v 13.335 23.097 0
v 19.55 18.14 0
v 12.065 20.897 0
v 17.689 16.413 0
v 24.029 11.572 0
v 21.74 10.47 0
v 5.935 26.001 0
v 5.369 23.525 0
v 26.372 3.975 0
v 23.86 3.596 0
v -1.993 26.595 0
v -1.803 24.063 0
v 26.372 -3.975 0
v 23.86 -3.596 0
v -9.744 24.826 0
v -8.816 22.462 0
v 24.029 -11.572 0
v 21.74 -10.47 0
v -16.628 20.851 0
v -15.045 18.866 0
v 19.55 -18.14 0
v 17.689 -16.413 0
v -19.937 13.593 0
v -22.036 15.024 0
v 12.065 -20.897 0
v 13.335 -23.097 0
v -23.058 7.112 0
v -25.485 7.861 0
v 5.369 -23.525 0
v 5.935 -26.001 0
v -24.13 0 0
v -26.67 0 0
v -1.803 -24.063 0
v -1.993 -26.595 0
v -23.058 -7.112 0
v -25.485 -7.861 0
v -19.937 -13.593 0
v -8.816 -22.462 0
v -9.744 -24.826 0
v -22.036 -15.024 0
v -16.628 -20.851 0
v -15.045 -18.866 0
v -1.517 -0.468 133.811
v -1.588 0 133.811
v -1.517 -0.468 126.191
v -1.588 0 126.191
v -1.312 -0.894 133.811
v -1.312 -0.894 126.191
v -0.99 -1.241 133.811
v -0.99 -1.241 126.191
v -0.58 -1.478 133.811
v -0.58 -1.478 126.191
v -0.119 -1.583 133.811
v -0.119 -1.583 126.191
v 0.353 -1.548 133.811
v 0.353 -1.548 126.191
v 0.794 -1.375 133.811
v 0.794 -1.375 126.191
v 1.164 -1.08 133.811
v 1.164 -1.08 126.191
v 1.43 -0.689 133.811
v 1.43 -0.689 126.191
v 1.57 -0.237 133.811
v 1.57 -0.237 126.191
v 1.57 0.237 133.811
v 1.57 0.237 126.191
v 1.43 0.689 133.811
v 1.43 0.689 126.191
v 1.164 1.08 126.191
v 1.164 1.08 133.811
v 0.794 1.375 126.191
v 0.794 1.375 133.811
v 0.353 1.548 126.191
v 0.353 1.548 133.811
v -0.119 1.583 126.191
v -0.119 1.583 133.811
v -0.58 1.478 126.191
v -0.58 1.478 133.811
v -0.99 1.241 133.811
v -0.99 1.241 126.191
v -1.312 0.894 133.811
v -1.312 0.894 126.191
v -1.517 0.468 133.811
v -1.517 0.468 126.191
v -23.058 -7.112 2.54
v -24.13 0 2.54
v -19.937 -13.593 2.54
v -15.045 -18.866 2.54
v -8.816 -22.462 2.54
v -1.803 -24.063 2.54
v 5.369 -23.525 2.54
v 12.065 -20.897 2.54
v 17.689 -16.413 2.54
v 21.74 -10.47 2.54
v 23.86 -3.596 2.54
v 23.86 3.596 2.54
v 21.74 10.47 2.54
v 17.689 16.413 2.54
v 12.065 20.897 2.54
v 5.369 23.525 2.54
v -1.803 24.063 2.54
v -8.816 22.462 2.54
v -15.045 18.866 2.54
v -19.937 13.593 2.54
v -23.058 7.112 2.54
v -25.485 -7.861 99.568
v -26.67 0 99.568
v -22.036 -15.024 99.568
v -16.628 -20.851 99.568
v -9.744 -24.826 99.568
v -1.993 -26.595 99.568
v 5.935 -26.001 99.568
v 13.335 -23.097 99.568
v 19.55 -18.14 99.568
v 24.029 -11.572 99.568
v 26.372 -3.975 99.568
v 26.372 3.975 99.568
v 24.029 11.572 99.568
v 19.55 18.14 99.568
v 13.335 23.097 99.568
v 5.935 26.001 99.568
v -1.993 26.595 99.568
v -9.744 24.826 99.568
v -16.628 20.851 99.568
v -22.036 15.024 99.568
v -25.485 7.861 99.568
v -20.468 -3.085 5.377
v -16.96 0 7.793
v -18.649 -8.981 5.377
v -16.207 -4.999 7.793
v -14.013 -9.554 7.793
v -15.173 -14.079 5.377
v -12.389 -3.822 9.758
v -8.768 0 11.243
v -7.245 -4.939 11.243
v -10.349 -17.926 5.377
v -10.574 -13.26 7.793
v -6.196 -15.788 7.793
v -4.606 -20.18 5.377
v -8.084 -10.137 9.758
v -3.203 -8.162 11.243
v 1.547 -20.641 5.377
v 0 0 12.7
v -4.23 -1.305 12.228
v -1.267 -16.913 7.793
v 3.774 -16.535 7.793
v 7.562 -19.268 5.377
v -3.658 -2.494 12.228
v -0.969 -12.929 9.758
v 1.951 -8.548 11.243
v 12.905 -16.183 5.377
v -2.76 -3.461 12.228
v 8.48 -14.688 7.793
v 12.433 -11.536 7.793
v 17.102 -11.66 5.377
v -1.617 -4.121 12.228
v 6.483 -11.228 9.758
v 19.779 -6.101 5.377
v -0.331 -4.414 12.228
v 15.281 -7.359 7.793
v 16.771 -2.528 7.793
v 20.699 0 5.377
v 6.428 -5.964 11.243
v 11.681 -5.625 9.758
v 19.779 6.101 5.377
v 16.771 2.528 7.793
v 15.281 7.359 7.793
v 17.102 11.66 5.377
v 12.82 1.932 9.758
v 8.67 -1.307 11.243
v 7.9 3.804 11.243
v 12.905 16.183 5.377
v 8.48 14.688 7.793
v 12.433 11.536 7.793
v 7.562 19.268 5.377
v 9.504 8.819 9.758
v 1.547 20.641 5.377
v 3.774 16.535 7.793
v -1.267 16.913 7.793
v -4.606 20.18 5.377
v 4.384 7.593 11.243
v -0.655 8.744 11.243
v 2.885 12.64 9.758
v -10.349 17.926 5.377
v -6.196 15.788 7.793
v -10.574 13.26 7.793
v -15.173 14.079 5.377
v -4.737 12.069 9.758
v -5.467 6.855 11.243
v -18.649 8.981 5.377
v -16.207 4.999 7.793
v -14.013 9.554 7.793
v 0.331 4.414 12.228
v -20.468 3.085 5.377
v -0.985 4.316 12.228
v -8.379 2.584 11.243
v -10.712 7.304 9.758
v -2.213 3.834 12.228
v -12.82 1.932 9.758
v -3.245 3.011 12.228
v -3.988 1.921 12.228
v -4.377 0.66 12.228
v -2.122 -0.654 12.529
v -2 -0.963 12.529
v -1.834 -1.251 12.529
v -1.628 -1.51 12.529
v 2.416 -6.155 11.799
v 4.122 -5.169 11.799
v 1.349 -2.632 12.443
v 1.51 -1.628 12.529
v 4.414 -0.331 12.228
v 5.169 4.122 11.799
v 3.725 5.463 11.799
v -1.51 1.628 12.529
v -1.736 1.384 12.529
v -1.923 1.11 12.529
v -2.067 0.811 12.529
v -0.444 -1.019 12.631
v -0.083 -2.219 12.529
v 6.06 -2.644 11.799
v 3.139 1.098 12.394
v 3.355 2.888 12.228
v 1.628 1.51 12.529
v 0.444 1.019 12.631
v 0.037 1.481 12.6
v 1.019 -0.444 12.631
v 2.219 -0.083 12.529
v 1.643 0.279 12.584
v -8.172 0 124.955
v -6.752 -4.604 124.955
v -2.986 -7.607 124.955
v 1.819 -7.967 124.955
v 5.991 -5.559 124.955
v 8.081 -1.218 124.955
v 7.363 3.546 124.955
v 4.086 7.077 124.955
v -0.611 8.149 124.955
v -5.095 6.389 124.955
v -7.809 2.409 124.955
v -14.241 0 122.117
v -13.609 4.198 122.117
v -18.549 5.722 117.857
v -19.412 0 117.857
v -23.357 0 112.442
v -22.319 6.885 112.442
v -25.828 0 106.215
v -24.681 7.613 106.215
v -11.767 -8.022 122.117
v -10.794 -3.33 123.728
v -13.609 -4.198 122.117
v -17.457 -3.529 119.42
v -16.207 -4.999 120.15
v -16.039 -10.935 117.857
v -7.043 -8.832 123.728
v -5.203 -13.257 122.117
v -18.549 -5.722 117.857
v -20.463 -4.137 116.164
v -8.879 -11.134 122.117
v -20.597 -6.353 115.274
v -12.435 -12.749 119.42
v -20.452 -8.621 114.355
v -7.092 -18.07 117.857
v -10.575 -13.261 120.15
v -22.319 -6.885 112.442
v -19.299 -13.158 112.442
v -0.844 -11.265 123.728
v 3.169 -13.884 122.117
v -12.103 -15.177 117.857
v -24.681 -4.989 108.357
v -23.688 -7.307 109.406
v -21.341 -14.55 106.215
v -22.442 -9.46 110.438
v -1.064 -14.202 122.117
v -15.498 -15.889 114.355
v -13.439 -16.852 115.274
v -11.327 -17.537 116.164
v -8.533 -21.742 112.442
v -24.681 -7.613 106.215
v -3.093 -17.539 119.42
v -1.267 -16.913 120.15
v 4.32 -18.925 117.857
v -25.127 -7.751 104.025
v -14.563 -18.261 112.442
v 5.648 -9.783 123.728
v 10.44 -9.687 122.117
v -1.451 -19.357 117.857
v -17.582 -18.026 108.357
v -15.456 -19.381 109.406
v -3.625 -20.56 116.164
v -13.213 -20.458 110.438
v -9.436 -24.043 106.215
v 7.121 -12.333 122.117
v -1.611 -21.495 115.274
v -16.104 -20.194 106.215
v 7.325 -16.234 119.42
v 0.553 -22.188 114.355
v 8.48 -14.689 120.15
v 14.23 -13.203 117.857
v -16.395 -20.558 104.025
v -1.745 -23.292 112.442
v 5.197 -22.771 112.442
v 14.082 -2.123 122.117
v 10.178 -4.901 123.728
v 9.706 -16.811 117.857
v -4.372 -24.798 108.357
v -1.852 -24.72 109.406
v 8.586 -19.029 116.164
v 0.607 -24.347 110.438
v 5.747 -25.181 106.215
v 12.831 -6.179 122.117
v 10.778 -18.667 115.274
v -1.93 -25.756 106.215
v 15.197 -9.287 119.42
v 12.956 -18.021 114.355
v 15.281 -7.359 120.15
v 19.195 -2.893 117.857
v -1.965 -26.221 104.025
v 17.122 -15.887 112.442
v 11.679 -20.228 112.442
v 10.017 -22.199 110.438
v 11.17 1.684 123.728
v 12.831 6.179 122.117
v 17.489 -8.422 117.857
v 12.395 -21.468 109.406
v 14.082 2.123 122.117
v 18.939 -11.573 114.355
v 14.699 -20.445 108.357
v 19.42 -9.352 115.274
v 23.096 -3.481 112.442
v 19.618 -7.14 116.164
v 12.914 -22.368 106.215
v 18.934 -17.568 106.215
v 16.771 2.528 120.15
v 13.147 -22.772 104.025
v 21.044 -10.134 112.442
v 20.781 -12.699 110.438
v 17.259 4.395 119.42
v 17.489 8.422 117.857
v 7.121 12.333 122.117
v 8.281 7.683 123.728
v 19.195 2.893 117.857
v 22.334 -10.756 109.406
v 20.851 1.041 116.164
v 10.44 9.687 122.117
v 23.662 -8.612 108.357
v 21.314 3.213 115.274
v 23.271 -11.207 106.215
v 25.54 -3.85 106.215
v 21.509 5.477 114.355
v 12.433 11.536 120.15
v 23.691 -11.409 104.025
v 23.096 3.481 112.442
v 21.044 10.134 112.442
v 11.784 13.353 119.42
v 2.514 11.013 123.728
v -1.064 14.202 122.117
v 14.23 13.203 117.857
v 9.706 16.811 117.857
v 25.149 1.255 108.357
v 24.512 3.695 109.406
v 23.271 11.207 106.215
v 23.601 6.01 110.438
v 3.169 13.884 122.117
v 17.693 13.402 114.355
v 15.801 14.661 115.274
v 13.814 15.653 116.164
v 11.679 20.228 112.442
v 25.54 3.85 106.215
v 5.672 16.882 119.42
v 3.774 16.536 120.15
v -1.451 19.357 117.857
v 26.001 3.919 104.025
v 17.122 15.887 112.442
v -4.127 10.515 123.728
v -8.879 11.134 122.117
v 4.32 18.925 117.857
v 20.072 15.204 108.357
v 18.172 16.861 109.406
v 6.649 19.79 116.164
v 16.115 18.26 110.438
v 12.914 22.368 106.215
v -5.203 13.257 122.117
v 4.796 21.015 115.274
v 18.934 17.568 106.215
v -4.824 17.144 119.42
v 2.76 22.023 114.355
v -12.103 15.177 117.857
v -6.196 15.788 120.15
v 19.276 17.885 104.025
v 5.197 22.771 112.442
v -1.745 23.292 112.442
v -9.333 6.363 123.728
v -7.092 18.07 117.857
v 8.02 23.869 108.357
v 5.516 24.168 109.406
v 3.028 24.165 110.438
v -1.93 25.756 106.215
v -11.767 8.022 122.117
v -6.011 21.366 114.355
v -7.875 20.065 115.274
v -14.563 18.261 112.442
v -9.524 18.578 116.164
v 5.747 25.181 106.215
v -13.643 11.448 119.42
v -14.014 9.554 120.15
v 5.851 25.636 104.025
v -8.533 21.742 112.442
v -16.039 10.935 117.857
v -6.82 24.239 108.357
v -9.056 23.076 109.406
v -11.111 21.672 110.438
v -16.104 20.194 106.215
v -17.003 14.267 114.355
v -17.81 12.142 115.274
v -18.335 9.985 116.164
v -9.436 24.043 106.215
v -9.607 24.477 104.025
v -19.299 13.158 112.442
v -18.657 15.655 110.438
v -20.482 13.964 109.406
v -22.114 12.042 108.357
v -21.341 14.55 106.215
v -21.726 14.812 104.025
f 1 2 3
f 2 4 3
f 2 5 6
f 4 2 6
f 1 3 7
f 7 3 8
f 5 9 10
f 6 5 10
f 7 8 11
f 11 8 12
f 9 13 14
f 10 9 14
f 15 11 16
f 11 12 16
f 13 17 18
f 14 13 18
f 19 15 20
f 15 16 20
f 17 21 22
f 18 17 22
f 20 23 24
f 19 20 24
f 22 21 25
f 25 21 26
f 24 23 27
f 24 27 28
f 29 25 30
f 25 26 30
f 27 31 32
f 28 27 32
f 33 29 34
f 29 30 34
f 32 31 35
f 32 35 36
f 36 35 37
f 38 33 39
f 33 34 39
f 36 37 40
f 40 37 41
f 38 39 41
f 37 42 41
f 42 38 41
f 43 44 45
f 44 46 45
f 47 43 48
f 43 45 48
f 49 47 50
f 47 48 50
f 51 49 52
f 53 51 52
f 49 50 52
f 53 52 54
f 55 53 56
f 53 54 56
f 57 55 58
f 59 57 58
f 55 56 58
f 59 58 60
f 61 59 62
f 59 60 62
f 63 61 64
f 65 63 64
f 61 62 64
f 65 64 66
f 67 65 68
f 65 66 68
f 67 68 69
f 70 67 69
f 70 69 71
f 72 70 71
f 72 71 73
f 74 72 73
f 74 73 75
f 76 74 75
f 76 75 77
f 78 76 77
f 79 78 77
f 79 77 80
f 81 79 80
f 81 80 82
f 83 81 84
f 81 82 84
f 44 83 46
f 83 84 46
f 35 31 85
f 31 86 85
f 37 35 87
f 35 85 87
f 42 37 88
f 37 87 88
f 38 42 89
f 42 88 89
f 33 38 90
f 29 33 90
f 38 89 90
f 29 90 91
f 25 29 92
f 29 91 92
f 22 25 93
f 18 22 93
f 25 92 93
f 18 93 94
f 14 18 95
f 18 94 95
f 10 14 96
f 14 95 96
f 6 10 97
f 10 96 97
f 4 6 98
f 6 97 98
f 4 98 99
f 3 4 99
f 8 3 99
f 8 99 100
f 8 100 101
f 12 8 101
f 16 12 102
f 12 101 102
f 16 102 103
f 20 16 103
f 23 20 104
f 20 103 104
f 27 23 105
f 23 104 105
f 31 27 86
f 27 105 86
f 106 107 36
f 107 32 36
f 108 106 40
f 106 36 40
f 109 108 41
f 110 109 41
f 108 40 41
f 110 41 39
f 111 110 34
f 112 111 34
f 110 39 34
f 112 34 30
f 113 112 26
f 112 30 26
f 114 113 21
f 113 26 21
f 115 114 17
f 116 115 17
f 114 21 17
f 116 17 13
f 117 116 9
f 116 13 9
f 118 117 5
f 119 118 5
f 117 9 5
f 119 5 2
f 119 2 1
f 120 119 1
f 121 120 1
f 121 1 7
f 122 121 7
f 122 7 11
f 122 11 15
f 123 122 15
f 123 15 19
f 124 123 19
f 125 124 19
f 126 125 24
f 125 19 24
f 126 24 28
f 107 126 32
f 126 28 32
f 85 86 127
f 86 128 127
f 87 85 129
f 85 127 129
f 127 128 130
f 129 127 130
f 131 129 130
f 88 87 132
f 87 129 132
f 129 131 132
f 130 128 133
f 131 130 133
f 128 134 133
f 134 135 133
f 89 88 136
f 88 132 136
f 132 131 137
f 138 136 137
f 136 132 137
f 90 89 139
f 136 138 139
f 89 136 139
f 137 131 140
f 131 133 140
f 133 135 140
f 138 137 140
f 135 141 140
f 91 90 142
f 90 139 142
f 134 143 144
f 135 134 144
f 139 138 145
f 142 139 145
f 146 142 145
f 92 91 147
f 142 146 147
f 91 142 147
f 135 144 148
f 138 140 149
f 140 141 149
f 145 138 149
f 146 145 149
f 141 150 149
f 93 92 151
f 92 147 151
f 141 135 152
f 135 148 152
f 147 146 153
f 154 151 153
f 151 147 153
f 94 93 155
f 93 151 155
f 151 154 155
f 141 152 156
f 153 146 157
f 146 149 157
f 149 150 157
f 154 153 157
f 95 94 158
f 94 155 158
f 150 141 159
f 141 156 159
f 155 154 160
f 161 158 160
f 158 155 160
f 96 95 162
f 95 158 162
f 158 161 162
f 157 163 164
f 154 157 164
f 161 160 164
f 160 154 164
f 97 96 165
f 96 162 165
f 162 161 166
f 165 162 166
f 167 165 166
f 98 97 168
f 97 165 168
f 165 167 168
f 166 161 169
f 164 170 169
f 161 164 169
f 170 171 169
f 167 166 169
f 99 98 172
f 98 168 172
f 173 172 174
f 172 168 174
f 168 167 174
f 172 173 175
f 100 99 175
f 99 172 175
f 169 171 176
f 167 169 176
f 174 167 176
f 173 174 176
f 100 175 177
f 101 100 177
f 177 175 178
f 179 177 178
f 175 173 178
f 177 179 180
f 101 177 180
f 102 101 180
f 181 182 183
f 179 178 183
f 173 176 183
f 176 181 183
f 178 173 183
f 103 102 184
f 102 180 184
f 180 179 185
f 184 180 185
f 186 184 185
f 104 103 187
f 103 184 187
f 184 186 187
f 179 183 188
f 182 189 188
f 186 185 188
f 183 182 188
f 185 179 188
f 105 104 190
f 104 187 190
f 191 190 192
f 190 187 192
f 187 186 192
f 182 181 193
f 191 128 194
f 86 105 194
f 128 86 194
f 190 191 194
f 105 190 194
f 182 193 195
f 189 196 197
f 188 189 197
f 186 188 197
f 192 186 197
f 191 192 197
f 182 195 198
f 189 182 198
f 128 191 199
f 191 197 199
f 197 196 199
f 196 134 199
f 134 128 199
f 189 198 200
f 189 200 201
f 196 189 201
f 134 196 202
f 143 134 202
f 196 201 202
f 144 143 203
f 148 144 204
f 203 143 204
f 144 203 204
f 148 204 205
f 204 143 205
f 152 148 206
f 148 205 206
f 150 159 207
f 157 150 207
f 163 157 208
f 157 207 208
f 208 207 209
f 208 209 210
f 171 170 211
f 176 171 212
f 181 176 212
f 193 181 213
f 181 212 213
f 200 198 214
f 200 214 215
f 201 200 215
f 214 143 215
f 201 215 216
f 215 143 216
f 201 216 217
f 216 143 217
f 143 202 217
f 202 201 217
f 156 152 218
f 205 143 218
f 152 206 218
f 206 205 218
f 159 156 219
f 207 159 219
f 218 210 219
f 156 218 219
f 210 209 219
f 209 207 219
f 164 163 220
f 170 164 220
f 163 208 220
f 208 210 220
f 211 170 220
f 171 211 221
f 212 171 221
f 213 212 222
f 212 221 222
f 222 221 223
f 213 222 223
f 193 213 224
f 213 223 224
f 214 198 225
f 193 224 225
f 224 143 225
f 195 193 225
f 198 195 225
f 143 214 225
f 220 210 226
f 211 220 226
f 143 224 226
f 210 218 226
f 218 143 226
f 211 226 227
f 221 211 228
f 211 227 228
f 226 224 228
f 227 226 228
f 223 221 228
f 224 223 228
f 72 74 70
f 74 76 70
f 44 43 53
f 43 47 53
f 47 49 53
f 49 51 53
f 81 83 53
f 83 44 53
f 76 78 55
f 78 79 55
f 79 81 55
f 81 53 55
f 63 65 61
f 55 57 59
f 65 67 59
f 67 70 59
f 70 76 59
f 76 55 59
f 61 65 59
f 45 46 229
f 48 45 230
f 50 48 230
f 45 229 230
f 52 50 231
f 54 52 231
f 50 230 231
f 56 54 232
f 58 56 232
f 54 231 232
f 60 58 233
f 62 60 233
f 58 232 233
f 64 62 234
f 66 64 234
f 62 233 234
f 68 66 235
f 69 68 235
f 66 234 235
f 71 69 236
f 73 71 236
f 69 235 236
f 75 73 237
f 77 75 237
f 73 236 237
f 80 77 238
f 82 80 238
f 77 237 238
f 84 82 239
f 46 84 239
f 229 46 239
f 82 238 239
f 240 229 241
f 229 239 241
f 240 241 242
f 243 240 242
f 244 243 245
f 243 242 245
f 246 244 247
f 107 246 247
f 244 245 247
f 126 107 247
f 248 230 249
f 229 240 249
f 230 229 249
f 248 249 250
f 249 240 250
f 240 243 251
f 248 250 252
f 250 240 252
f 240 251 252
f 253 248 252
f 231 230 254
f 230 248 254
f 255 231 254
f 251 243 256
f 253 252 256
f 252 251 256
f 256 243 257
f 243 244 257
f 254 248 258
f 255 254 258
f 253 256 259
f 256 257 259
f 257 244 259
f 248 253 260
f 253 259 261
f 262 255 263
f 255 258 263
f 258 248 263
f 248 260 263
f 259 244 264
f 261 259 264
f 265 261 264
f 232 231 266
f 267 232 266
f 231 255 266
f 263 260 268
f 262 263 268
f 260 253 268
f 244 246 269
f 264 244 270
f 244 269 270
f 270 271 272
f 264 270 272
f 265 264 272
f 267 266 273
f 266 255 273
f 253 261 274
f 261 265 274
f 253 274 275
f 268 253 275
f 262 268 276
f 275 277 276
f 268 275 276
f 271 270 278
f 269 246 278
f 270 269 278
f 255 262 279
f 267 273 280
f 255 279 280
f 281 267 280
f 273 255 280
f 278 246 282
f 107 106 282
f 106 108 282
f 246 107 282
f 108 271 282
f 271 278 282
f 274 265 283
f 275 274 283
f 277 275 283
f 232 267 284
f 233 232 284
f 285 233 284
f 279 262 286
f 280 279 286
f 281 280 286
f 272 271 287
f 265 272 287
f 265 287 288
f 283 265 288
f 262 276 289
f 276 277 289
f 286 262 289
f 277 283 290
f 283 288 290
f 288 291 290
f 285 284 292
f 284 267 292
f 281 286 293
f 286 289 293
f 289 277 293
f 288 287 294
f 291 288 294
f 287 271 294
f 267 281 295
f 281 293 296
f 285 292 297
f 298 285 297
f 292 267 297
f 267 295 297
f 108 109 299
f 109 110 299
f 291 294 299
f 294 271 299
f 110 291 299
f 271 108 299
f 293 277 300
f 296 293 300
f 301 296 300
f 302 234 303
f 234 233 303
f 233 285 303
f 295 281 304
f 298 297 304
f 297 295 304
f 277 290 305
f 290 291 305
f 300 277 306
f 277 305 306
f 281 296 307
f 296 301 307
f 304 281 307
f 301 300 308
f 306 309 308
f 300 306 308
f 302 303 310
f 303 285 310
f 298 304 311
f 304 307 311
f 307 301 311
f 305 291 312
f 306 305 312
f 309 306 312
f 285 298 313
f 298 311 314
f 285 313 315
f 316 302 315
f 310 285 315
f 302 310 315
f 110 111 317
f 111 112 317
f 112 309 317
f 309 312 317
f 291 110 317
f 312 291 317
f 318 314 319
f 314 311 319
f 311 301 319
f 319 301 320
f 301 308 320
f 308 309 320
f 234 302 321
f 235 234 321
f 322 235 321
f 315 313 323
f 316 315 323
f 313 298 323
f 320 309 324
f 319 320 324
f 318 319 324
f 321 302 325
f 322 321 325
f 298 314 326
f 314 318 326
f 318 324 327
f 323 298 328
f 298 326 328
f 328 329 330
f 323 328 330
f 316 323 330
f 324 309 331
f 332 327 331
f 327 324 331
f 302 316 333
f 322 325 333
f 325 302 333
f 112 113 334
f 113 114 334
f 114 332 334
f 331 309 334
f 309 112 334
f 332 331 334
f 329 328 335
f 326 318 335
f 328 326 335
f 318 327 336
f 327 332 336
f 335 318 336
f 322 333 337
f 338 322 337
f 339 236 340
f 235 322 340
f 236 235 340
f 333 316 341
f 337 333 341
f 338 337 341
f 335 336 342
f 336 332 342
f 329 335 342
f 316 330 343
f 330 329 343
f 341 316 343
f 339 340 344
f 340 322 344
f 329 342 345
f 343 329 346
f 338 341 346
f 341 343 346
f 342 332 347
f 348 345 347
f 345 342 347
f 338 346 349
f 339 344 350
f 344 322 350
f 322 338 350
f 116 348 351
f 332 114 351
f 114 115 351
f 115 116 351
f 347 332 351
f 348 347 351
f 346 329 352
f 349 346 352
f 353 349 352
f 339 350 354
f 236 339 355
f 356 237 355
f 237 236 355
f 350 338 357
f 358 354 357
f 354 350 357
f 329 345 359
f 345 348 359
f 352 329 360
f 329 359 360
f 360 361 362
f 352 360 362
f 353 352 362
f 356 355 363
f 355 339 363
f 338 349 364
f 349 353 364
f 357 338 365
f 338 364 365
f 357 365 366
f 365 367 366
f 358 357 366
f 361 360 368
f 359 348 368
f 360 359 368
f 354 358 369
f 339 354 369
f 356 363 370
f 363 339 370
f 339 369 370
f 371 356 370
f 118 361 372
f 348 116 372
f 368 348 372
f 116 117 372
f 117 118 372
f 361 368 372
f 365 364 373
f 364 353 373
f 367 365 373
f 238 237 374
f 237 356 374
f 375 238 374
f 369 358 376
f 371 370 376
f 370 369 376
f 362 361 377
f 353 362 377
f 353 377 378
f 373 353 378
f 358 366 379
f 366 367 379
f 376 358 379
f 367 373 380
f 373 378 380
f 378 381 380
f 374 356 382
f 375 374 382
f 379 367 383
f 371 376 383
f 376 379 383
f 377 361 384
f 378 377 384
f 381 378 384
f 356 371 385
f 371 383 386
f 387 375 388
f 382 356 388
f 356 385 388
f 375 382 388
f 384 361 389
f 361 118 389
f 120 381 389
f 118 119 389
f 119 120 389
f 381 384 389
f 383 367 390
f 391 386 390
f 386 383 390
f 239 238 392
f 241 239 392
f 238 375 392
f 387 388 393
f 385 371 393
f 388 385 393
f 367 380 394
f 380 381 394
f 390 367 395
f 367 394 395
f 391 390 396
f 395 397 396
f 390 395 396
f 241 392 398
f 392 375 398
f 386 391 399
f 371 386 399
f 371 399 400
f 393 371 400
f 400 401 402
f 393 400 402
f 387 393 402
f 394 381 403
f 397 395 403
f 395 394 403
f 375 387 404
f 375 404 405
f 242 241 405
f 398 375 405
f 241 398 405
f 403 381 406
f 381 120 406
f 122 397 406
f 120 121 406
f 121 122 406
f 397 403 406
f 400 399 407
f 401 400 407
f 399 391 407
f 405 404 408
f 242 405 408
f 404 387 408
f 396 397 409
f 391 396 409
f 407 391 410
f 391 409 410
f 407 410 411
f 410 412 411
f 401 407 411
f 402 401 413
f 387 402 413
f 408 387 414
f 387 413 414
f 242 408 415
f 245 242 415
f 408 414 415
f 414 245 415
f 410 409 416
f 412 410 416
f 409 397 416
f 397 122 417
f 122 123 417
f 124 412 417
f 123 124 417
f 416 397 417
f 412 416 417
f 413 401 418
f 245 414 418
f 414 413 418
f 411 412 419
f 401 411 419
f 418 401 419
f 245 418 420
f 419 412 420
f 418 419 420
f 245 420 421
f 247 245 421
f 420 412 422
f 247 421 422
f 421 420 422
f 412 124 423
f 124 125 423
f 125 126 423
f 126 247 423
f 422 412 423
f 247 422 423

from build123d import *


with BuildPart() as f1:
    # F0 (on Front) → F1 (revolve)
    with BuildSketch(Plane.XZ):
        with BuildLine():
            Line((-26.67, 99.568), (-26.67, 0))
            Line((-26.67, 0), (-24.13, 0))
            Line((-24.13, 0), (-24.13, 2.54))
            ThreePointArc((-24.13, 2.54), (-12.965124, 9.757795), (0, 12.7))
            Line((0, 12.7), (0, 133.810711))
            Line((0, 133.810711), (-1.5875, 133.810711))
            Line((-1.5875, 133.810711), (-1.5875, 126.190711))
            ThreePointArc((-1.5875, 126.190711), (-19.411691, 117.856661), (-26.67, 99.568))
        make_face()
    revolve(axis=Axis((0, 0, 73.255356), (0, 0, 1)))


with BuildPart() as f3:
    # F2 (on Front) → F3 (revolve)
    with BuildSketch(Plane.XZ):
        Polygon((-9.525, 133.810711), (0, 133.810711), (0, 151.590711), (-1.5875, 151.590711), (-1.5875, 138.890711), (-12.065, 138.890711), (-12.065, 121.110711), (-9.525, 121.110711), align=None)
    revolve(axis=Axis((0, 0, 142.700711), (0, 0, -1)))


solid = f1.part
